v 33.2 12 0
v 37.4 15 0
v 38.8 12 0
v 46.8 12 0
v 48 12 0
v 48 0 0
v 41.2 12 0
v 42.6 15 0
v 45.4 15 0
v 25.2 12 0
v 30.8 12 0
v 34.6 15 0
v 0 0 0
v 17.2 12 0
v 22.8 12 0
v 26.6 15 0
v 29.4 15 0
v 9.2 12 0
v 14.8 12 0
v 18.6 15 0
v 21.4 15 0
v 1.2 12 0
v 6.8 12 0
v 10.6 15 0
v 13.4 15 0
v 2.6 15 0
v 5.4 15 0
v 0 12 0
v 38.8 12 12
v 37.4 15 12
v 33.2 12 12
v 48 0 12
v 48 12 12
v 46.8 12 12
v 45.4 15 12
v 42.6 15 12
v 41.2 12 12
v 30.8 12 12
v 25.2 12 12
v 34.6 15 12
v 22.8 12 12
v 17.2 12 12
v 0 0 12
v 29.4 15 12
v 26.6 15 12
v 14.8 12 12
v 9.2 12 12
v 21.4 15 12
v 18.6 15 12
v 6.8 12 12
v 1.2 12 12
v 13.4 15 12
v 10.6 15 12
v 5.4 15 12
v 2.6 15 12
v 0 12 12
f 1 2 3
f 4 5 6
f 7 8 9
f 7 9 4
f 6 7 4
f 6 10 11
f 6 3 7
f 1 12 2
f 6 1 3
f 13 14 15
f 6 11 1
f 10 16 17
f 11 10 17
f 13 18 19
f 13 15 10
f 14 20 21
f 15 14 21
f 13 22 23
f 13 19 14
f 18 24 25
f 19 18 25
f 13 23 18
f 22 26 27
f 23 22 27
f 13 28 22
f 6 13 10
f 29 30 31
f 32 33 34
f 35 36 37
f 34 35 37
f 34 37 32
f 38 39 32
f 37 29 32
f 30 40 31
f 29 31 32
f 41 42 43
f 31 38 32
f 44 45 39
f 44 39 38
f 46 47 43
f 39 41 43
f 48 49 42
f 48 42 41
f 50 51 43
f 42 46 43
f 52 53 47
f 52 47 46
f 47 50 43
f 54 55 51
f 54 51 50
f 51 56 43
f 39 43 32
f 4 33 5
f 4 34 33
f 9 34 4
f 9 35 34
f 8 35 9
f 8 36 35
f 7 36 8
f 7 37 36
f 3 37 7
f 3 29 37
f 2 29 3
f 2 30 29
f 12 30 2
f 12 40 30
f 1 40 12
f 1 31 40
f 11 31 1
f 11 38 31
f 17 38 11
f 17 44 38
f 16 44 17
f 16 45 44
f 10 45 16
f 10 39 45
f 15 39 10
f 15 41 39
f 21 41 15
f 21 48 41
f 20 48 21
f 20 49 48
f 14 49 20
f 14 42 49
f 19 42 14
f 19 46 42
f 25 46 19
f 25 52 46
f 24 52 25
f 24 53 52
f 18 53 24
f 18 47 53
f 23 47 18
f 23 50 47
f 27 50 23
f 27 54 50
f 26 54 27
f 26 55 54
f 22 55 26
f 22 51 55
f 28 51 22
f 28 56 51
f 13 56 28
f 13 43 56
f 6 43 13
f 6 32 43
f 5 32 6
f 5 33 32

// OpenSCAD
$fn = 32;

// ----------------------------------------------------------------------
// Gear rack: 6 teeth, pitch 8 mm
// ----------------------------------------------------------------------

// --- parameters (mm) ---
teeth = 6;                // number of teeth
pitch = 8;                // tooth pitch, X
root_w = 5.6;             // tooth width at the root
tip_w = 2.8;              // tooth width at the tip
base_h = 12;              // rack body height, Y
tooth_h = 3;              // tooth height above the body
plate_t = 12;             // rack width, Z (extrusion height)
fit_tol = 0.05;           // declared fit tolerance (prompt contract)
free_tol = 0.2;           // declared free tolerance (prompt contract)

rack_l = teeth * pitch;  // overall length
total_h = base_h + tooth_h;  // overall height

profile = [[0, 0], [48, 0], [48, 12], [46.8, 12], [45.4, 15], [42.6, 15], [41.2, 12], [38.8, 12], [37.4, 15], [34.6, 15], [33.2, 12], [30.8, 12], [29.4, 15], [26.6, 15], [25.2, 12], [22.8, 12], [21.4, 15], [18.6, 15], [17.2, 12], [14.8, 12], [13.4, 15], [10.6, 15], [9.2, 12], [6.8, 12], [5.4, 15], [2.6, 15], [1.2, 12], [0, 12]];  // primary outline, 28 points, counter clockwise

// --- the one profile operation ---
linear_extrude(height = plate_t) polygon(points = profile);
